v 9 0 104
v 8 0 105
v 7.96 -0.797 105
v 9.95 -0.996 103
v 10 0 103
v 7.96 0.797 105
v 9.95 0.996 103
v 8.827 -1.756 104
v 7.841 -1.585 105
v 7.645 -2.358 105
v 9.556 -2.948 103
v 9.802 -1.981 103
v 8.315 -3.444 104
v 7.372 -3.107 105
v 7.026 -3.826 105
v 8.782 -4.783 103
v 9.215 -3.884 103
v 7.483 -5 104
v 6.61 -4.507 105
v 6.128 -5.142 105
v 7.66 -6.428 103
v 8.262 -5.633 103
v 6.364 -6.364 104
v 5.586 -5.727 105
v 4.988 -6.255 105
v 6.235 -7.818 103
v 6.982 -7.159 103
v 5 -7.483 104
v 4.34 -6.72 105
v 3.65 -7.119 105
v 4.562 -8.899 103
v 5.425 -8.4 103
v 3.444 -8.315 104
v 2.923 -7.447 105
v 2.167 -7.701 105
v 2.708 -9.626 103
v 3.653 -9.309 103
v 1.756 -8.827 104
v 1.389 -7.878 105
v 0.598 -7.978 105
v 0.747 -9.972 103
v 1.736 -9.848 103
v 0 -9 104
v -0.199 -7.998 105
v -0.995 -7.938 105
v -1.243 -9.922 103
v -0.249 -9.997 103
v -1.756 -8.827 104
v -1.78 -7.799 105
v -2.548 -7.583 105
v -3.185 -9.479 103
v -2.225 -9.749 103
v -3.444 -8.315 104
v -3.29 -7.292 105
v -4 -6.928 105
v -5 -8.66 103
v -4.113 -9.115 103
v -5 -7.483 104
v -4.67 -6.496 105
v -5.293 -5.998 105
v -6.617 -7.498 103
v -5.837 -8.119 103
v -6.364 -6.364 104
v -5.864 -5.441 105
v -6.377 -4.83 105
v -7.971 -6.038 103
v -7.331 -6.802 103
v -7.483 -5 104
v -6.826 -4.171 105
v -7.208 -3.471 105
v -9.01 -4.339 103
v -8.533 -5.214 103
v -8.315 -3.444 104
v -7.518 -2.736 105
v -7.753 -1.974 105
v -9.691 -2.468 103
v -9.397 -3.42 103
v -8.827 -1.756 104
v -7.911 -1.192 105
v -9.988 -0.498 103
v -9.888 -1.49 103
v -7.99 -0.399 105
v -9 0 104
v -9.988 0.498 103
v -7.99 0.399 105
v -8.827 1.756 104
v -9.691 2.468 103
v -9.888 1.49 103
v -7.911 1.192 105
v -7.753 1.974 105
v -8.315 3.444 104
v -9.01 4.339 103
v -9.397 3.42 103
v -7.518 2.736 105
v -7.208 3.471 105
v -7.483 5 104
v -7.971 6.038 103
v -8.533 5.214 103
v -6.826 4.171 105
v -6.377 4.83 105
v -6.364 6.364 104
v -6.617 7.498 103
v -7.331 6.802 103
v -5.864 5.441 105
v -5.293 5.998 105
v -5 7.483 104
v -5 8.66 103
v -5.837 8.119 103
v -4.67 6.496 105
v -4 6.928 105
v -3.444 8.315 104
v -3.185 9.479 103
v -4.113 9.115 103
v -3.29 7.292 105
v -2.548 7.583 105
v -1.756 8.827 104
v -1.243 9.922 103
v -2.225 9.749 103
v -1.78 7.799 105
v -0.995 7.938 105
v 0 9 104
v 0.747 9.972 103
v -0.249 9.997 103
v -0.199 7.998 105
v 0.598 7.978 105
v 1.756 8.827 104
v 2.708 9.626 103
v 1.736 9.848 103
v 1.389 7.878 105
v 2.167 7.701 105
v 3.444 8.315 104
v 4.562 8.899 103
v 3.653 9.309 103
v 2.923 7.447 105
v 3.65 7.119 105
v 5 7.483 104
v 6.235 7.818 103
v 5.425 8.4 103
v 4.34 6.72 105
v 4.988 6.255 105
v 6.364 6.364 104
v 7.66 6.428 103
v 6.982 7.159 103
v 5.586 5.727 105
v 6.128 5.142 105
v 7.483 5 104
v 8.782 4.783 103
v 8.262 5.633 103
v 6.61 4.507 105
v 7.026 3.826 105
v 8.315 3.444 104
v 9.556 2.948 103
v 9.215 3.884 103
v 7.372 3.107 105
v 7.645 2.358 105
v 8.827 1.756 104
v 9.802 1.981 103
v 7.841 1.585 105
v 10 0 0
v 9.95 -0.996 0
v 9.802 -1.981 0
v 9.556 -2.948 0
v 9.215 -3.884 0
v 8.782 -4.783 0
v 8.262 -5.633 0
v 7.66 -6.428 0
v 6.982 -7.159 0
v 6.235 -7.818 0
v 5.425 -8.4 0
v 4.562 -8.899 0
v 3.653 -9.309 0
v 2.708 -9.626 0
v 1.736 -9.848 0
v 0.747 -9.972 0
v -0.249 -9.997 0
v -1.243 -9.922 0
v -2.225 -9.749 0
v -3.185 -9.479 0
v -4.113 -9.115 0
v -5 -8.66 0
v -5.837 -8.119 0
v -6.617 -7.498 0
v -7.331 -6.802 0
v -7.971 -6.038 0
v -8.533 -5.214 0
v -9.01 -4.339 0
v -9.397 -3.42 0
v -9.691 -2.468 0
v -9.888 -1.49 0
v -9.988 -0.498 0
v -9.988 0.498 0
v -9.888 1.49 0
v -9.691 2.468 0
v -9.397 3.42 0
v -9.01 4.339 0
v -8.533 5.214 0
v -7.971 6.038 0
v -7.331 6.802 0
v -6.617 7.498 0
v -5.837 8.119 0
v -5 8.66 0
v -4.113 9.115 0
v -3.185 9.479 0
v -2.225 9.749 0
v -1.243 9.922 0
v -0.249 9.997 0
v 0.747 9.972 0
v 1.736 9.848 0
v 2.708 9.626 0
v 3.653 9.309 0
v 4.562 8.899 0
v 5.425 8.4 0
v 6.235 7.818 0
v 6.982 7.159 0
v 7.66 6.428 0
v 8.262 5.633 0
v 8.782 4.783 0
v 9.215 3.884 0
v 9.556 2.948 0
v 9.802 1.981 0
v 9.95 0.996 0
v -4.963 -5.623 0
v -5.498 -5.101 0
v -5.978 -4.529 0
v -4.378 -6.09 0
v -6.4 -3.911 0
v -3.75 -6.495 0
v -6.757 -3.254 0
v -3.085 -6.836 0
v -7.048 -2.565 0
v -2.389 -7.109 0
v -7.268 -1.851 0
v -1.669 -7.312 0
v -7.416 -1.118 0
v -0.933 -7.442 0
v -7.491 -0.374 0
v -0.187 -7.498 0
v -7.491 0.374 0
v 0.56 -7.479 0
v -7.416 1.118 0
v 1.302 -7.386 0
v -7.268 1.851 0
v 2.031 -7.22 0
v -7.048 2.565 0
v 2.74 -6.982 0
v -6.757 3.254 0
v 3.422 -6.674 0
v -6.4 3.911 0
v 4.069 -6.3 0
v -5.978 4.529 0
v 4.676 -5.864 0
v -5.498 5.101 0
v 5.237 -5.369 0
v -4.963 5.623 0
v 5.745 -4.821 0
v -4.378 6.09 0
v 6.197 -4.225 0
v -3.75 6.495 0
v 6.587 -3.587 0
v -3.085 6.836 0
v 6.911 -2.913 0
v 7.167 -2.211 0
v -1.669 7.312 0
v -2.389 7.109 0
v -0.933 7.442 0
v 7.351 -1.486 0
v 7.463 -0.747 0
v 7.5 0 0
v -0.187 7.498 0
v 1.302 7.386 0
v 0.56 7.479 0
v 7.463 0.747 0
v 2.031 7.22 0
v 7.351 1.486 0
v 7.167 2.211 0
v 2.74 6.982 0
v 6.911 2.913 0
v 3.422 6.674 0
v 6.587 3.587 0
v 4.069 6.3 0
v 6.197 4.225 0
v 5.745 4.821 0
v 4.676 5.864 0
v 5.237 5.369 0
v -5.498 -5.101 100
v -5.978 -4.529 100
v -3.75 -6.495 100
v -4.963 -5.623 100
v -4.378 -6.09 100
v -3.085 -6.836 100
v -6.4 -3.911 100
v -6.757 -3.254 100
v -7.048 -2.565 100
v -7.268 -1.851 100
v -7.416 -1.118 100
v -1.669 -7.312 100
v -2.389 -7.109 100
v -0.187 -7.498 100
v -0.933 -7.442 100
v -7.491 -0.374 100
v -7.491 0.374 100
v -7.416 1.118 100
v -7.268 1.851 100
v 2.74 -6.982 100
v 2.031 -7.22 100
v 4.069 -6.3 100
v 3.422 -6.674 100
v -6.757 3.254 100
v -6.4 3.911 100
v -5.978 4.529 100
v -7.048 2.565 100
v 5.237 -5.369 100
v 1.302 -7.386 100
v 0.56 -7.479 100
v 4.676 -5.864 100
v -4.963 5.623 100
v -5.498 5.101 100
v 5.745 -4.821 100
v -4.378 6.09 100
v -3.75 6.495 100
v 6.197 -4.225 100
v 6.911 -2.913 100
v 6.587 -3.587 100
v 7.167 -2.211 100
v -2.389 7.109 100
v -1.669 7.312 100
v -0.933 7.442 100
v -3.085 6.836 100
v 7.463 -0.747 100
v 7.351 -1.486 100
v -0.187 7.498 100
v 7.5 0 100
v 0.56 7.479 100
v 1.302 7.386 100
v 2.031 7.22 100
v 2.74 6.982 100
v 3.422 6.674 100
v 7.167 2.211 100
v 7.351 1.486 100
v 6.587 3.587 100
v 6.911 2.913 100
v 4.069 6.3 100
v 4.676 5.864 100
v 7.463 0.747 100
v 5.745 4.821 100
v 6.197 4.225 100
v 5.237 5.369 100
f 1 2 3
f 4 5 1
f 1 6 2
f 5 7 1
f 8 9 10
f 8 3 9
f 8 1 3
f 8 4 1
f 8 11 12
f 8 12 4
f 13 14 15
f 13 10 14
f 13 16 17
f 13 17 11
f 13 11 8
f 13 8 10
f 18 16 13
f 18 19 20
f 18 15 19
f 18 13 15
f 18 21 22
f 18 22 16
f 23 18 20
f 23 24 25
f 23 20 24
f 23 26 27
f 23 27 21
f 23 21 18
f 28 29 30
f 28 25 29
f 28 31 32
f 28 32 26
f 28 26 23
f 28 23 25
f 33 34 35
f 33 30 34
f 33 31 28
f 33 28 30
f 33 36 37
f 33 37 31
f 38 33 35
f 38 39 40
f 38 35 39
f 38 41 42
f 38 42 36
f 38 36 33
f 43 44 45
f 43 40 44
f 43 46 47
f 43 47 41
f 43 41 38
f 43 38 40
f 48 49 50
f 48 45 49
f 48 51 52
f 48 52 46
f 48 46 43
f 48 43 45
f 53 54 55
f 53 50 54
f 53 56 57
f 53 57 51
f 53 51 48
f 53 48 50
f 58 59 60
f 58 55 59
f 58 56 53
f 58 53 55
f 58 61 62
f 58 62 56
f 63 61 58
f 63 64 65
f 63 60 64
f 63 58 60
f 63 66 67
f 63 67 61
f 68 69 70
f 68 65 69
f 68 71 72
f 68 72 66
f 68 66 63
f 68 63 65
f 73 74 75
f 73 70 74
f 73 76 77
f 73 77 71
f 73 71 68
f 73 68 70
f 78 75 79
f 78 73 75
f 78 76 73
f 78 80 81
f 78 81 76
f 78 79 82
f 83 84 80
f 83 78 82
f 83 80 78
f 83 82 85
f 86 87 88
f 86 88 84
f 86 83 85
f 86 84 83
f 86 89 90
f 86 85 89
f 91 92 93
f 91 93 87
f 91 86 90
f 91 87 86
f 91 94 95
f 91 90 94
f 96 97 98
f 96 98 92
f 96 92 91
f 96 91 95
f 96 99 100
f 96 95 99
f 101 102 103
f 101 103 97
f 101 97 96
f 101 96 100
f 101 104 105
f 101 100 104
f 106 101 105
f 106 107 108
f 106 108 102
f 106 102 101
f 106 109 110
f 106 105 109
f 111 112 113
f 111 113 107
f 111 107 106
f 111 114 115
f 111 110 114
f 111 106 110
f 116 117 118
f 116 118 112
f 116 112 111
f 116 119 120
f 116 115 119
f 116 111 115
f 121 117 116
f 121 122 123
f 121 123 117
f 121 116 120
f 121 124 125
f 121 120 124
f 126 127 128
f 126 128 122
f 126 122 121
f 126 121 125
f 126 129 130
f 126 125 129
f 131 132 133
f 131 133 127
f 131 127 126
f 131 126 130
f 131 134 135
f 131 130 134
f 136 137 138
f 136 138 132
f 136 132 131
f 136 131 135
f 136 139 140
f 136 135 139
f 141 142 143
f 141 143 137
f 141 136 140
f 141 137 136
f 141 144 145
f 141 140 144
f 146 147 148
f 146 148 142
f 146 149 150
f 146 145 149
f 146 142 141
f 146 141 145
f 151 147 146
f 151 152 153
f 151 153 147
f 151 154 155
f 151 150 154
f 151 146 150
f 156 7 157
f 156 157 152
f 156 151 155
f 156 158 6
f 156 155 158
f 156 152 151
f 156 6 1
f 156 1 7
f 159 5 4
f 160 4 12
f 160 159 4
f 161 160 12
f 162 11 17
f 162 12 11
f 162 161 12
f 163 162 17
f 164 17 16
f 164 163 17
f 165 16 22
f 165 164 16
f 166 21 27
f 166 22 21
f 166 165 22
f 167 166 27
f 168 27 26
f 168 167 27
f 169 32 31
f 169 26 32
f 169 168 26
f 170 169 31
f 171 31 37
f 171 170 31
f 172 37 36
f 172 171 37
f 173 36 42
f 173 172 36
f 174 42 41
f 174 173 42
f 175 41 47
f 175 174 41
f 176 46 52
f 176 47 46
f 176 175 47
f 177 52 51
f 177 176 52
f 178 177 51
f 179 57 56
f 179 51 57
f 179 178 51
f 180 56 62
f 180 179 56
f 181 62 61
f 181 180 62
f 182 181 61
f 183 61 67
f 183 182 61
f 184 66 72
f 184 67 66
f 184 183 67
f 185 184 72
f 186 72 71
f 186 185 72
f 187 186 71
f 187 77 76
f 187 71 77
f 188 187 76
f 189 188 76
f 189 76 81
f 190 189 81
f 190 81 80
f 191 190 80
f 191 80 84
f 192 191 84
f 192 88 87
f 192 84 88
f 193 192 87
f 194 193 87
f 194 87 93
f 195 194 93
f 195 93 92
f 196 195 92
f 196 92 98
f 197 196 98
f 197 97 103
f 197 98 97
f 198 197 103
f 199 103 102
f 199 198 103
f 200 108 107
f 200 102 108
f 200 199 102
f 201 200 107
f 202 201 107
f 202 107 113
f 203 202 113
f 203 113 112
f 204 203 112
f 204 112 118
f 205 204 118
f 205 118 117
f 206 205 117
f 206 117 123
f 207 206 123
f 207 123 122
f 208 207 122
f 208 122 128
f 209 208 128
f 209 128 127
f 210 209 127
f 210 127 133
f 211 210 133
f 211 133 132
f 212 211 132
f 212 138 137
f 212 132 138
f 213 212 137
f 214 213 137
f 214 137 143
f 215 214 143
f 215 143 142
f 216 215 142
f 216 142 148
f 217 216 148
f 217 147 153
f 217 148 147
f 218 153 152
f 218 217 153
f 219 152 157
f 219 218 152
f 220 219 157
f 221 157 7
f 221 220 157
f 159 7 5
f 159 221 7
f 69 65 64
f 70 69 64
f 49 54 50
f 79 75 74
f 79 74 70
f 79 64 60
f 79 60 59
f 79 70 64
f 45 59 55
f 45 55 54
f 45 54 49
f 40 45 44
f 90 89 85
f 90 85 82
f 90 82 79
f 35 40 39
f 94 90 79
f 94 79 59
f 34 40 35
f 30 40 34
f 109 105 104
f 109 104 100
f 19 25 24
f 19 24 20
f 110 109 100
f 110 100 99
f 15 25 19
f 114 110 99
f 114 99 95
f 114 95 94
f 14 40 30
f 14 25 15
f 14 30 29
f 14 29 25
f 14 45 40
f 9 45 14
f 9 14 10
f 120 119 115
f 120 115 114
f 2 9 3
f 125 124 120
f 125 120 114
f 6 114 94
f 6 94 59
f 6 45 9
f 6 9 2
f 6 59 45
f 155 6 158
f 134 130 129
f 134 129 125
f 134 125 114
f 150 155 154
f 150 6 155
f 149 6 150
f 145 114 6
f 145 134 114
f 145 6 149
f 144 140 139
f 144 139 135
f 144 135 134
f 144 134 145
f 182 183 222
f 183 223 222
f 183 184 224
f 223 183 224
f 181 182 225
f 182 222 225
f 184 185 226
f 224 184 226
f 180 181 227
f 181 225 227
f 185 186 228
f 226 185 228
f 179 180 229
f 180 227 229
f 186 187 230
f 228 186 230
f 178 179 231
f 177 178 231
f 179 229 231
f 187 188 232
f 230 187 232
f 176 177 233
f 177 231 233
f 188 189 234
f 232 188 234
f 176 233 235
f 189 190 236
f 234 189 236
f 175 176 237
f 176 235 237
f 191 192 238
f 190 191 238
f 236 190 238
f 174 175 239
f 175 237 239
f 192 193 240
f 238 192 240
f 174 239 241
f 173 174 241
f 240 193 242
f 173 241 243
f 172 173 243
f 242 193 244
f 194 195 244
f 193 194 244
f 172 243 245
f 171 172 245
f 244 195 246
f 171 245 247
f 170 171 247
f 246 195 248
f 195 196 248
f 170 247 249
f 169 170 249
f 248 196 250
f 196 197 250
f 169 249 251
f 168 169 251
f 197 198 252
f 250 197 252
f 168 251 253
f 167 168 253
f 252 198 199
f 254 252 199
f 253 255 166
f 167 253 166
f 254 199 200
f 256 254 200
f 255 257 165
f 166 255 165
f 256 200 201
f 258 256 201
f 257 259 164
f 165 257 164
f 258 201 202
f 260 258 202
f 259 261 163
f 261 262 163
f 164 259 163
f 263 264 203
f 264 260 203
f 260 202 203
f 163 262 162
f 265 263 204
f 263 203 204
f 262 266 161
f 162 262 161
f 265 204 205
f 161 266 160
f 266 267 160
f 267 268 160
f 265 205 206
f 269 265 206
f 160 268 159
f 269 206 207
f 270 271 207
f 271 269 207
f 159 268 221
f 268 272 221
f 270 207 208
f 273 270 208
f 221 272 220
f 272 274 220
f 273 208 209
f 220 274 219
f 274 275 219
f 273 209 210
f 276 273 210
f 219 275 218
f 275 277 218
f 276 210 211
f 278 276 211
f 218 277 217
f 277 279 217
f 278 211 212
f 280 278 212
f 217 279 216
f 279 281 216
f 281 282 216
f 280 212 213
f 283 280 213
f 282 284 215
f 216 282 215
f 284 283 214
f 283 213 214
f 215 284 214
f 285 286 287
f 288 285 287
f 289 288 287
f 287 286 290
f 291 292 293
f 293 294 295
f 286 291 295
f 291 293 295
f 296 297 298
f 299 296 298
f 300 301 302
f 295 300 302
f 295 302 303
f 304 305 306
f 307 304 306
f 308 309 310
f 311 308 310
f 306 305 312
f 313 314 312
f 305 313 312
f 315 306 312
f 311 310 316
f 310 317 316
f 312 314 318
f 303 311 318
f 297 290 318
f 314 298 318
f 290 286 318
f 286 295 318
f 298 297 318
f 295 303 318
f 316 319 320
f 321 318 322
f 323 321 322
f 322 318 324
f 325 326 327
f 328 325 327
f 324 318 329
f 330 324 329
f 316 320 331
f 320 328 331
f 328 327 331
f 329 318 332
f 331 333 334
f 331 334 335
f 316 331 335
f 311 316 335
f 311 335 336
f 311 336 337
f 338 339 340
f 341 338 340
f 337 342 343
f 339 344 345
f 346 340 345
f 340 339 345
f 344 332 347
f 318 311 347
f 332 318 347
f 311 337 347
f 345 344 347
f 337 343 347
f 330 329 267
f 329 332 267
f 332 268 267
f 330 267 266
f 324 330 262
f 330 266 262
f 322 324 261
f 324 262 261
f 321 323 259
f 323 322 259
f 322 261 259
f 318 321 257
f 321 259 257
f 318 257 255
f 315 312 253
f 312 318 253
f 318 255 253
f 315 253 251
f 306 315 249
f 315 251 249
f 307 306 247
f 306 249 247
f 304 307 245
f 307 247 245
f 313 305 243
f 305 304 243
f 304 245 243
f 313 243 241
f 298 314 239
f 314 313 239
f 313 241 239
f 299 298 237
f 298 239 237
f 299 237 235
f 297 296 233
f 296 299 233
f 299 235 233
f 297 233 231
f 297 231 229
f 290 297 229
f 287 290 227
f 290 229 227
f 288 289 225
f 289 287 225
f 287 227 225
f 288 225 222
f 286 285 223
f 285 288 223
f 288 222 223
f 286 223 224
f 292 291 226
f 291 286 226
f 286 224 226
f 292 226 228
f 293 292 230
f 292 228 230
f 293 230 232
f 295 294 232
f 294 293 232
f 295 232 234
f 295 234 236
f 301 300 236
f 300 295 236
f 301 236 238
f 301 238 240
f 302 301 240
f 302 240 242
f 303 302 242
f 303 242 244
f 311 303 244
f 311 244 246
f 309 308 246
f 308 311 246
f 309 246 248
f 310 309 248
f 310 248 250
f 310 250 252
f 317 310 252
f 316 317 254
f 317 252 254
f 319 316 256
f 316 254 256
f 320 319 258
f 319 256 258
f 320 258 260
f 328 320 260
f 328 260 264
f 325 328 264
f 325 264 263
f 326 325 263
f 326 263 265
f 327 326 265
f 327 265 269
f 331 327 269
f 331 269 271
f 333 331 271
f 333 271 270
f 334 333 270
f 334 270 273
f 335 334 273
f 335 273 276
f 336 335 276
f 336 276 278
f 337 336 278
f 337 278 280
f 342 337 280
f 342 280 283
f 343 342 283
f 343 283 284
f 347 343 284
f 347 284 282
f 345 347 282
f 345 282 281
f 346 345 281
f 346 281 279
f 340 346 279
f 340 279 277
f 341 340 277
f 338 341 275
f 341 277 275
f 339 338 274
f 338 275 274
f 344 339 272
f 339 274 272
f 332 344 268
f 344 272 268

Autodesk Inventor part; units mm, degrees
ref_plane "YZ Plane" through (0, 0, 0) normal (1, 0, 0) x (0, 1, 0)
ref_plane "XZ Plane" through (0, 0, 0) normal (0, 1, 0) x (-1, 0, 0)
ref_plane "XY Plane" through (0, 0, 0) normal (0, 0, 1) x (1, 0, 0)
sketch "Skizze1" plane through (0, 0, 0) normal (0, 0, 1) x (1, 0, 0)
  circle A0 centre (0, 0) radius 7.5
  circle A1 centre (0, 0) radius 10
  dimension "d0" = 15
  dimension "d1" = 20
extrude "Extrusion1" add sketch "Skizze1" along normal blind 100
sketch "Skizze2" plane through (0, 0, 100) normal (0, 0, 1) x (1, 0, 0)
  circle A0 centre (0, 0) radius 10 projected
extrude "Extrusion2" add sketch "Skizze2" along normal blind 5
chamfer "Fase1" distance 2 angle 45 1 edges at (-10, 0, 105)
properties part number "Magazin"
